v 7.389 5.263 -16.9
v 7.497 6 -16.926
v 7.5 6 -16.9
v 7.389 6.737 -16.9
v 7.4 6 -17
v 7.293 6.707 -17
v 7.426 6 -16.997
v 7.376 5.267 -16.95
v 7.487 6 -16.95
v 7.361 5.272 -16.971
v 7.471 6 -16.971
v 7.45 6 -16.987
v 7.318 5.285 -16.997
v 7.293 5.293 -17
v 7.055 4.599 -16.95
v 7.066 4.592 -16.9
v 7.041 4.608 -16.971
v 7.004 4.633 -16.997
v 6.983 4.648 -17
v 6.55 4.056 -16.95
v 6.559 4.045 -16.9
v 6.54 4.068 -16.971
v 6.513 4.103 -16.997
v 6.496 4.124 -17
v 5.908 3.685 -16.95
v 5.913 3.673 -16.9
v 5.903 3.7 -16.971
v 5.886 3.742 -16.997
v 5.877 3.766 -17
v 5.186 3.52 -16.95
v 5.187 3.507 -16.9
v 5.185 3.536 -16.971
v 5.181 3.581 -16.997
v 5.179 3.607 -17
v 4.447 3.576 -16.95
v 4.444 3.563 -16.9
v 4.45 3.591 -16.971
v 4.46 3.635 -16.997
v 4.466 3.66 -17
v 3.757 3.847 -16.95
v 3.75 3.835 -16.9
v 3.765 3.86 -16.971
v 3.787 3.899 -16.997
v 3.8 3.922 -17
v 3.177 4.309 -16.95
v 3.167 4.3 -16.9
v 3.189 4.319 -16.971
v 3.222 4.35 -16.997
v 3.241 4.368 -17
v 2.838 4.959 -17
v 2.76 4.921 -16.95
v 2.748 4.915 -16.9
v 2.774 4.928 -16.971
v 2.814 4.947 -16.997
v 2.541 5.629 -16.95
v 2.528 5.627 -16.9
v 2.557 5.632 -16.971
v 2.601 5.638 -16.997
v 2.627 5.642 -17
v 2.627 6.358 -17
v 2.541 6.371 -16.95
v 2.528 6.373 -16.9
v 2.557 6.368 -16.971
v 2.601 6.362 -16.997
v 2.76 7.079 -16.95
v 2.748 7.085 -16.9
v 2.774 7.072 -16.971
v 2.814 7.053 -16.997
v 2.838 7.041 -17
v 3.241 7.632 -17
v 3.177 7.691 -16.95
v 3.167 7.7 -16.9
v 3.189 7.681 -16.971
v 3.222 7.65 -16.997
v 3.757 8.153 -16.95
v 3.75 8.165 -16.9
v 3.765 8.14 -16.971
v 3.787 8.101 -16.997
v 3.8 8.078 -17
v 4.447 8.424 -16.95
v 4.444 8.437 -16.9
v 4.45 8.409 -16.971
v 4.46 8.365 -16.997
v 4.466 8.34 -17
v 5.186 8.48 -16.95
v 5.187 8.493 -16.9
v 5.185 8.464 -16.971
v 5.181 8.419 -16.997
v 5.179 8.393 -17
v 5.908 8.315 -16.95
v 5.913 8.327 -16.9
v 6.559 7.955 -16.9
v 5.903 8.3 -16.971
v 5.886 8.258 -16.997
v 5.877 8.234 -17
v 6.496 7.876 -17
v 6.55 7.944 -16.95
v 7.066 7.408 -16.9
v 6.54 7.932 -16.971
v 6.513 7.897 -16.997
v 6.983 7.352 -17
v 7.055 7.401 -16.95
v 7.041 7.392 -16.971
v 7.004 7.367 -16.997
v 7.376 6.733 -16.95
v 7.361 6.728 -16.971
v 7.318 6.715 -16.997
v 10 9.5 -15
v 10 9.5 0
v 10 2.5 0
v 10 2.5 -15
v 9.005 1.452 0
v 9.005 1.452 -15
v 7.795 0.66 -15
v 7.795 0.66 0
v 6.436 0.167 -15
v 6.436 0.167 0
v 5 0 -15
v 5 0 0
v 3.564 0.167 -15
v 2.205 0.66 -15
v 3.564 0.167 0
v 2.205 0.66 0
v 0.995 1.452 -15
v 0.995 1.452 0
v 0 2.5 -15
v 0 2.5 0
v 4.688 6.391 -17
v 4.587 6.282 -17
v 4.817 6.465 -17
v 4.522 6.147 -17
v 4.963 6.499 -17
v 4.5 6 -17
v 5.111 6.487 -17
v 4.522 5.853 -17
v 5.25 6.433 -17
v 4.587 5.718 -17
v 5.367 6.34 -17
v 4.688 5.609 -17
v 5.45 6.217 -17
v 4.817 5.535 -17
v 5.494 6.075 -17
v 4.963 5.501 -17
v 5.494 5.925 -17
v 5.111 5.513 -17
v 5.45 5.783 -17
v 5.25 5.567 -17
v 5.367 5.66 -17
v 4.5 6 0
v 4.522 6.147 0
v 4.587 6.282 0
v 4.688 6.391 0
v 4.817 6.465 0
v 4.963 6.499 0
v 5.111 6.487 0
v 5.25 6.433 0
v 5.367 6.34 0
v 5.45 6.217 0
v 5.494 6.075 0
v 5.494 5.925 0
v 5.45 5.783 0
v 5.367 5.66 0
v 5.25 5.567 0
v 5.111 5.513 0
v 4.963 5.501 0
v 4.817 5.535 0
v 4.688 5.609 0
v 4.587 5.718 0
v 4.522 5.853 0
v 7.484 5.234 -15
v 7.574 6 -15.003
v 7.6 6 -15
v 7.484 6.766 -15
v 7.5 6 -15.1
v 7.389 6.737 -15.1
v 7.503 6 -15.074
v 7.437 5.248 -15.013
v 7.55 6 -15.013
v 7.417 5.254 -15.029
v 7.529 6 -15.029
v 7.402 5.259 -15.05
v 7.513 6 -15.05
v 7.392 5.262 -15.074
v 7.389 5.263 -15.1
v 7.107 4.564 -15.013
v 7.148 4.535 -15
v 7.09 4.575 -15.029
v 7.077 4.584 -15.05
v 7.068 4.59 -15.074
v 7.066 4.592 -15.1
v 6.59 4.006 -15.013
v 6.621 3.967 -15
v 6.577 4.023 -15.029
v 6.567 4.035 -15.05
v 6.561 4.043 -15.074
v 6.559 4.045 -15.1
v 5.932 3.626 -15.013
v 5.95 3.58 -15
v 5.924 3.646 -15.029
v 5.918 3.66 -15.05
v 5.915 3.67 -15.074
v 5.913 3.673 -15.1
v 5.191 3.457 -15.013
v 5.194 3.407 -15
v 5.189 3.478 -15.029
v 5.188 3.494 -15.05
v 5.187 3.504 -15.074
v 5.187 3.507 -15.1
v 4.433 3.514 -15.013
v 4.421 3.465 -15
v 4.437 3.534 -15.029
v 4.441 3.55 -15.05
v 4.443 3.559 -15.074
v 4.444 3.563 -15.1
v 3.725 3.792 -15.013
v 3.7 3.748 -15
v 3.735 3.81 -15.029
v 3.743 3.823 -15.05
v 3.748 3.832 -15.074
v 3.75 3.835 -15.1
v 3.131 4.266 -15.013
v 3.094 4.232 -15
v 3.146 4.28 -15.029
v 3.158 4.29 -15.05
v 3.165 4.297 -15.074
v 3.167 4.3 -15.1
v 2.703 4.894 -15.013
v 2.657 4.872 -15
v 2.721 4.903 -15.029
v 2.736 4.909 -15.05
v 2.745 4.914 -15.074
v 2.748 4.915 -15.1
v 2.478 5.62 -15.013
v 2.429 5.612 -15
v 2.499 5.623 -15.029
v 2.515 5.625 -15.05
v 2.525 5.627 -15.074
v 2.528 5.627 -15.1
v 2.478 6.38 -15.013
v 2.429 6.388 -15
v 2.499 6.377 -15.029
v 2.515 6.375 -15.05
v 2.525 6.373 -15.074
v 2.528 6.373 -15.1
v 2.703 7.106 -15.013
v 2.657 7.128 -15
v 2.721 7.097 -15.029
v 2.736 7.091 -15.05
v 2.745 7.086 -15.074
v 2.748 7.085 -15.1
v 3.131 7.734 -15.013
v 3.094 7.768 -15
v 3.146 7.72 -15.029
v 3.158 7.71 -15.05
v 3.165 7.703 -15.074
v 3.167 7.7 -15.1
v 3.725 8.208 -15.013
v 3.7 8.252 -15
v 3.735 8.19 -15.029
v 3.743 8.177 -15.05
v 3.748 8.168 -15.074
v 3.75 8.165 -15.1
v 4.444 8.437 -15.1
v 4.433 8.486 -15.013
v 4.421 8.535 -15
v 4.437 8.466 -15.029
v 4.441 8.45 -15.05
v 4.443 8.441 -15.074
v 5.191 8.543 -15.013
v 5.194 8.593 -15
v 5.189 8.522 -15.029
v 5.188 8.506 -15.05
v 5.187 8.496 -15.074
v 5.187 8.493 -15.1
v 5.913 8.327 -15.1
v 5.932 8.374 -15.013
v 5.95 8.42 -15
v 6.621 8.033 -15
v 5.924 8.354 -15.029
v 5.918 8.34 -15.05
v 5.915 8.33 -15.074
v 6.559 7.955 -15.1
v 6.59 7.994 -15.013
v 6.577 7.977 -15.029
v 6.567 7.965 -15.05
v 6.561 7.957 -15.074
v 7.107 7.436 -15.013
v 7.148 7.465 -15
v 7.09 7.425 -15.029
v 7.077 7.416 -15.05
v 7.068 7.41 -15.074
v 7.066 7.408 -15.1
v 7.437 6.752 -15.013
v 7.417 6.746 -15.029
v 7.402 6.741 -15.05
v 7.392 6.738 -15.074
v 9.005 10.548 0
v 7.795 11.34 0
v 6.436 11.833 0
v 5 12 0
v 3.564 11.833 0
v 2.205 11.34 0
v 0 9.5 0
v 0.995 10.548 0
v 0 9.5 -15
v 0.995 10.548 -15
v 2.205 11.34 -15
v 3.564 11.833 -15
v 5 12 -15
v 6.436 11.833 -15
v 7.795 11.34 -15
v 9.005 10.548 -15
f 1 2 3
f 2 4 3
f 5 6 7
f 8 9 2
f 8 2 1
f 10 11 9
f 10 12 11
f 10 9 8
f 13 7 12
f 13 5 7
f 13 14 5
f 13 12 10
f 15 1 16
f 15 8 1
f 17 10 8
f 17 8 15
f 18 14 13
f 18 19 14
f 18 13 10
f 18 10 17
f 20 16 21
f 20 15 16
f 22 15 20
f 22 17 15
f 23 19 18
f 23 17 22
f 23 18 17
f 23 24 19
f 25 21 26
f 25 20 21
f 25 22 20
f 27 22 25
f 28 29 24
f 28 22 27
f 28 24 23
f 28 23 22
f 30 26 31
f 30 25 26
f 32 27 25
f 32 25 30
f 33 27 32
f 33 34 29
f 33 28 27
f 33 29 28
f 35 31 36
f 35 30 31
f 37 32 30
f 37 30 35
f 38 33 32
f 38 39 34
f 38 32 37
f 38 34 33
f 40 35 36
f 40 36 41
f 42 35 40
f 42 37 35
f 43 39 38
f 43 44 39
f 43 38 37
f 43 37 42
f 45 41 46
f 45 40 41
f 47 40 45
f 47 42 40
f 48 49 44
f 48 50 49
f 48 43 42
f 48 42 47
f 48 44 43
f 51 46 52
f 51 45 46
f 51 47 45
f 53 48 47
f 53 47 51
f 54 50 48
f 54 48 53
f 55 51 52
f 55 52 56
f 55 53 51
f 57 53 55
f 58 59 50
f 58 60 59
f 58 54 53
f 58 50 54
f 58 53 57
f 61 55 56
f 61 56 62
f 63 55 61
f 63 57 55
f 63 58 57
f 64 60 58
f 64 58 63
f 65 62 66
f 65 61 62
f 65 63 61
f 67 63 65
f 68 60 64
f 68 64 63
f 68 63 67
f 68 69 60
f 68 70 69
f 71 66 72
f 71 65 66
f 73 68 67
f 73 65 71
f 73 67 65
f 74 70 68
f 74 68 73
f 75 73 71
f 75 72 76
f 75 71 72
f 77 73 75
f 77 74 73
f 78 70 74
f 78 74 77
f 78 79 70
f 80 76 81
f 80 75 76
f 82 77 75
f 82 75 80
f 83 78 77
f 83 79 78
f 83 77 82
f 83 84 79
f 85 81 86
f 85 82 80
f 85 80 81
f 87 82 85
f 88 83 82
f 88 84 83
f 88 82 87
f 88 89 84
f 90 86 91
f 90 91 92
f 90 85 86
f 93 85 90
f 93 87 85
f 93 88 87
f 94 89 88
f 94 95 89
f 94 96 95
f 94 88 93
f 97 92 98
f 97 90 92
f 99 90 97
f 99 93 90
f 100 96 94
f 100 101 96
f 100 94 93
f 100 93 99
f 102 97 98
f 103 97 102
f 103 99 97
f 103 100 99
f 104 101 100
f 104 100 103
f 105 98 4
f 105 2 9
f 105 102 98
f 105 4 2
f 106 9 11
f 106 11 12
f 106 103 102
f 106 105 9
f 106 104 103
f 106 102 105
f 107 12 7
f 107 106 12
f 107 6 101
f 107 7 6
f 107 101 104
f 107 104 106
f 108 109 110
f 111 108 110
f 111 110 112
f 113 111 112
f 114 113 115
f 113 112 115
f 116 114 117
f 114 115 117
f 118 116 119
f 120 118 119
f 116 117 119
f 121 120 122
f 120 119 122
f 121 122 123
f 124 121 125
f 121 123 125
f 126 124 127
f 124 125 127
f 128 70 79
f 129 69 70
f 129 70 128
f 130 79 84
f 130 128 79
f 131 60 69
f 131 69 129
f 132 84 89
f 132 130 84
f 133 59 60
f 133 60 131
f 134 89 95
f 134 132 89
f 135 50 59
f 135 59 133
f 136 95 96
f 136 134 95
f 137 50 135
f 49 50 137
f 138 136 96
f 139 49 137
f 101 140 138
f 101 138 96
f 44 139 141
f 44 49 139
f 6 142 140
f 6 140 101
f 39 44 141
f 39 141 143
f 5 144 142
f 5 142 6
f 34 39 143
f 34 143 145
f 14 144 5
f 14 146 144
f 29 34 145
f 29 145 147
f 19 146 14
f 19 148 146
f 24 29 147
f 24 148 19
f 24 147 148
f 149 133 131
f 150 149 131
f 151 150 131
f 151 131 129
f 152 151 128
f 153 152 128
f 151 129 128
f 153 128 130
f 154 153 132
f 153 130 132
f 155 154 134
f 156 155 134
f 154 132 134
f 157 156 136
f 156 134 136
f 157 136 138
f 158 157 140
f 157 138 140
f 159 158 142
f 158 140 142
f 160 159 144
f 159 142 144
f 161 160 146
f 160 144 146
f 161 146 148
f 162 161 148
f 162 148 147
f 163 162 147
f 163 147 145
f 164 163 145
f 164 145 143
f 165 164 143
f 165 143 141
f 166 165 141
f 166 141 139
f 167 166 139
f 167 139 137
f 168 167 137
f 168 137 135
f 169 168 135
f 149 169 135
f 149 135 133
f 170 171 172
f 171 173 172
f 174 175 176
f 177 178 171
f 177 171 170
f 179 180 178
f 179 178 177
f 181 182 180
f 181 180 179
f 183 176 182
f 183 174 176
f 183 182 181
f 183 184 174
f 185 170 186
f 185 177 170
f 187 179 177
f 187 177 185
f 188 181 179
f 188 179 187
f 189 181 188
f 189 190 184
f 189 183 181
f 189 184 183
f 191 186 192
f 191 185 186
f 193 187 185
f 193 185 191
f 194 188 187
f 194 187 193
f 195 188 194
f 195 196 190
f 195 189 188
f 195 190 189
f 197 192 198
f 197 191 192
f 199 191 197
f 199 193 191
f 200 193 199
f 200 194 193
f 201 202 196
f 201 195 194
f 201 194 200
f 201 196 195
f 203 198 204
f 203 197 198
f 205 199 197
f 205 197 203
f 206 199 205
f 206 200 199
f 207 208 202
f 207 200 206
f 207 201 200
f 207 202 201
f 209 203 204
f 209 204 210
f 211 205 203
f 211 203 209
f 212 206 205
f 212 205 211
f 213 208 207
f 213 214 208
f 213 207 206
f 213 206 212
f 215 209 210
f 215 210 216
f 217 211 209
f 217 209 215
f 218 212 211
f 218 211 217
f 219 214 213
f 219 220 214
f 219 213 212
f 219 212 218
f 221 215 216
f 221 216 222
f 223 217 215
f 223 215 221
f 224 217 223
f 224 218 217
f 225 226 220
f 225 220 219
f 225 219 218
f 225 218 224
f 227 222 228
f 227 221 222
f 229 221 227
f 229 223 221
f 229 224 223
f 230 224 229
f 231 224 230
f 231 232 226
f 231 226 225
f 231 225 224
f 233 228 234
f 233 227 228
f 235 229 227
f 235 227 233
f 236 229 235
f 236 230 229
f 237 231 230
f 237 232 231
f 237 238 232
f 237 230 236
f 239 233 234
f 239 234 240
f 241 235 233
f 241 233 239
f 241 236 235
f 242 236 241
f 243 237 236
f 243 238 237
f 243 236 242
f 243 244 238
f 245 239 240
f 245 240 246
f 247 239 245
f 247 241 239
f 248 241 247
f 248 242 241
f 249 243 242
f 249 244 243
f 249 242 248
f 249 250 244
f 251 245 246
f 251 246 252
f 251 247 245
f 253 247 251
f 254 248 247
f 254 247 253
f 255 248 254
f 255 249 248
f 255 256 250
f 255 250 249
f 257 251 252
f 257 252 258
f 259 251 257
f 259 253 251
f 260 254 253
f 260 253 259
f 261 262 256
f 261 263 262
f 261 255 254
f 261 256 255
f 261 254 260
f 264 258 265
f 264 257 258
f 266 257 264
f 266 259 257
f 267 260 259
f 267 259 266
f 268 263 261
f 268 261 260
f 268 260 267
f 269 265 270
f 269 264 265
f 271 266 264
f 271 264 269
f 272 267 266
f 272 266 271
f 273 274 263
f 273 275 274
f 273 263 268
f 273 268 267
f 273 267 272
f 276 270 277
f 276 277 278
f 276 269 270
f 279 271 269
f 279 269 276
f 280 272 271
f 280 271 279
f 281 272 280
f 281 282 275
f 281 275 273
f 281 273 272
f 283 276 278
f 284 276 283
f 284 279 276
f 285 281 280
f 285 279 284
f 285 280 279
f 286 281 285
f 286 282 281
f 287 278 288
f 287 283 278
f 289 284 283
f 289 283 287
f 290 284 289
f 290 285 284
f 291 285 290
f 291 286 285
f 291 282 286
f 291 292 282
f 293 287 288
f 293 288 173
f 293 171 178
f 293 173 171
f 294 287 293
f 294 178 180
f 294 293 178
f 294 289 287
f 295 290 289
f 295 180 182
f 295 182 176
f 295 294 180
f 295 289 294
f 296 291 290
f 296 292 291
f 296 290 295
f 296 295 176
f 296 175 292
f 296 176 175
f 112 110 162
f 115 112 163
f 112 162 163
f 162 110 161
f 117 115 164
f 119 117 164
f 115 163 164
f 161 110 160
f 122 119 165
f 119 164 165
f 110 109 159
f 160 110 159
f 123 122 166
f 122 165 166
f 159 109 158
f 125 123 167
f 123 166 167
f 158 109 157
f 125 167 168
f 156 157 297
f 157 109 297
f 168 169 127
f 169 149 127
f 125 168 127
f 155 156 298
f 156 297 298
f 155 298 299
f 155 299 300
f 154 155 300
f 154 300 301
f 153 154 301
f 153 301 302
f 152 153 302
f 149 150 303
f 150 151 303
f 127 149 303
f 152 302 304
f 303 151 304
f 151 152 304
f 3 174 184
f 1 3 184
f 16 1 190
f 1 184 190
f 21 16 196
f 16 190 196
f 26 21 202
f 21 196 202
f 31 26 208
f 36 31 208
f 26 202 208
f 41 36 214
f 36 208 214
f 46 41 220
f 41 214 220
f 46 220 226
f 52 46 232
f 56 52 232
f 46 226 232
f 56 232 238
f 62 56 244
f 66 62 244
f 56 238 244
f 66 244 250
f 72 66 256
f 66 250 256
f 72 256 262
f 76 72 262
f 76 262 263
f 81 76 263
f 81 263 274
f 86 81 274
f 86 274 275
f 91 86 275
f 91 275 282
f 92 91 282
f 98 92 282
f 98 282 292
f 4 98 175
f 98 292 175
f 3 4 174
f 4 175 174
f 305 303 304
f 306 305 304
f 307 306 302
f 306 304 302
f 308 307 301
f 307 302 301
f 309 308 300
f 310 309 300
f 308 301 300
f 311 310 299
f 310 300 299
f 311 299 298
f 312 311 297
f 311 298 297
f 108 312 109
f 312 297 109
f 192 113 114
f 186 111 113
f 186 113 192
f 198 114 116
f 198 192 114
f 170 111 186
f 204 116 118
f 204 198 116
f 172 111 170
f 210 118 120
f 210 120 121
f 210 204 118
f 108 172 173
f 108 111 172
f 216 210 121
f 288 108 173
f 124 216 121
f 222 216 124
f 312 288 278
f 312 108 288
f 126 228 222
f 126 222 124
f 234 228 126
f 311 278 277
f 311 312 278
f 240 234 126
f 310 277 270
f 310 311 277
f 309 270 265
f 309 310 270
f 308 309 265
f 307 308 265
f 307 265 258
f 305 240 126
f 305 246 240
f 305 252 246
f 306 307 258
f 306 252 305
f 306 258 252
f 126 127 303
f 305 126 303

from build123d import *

# Parameters (mm, degrees)
BOSS_EXTRUDE1_DEPTH = 15
SKETCH3_R           = 2.5
BOSS_EXTRUDE2_DEPTH = 2
SKETCH5_R           = 0.5
CUT_EXTRUDE1_DEPTH  = 24.086792761
FILLET1_R           = 0.1


with BuildPart() as part:
    # Sketch1 → Boss-Extrude1 (new body)
    with BuildSketch(Plane.XY):
        with BuildLine():
            Line((0, 2.5), (0, 9.5))
            ThreePointArc((0, 9.5), (5, 12), (10, 9.5))
            Line((10, 9.5), (10, 2.5))
            ThreePointArc((10, 2.5), (5, 0), (0, 2.5))
        make_face()
    extrude(amount=-BOSS_EXTRUDE1_DEPTH)

    # Sketch3 → Boss-Extrude2 (add)
    with BuildSketch(Plane(origin=(0, 0, -15), x_dir=(-1, 0, 0), z_dir=(0, 0, -1))):
        with Locations(Location((-5, 6, 0), (0, 0, 180))):
            Circle(SKETCH3_R)
    extrude(amount=BOSS_EXTRUDE2_DEPTH)

    # Sketch5 → Cut-Extrude1 (cut, through all)
    with BuildSketch(Plane(origin=(0, 0, -17), x_dir=(-1, 0, 0), z_dir=(0, 0, -1))):
        with Locations((-5, 6)):
            Circle(SKETCH5_R)
    extrude(amount=-CUT_EXTRUDE1_DEPTH, mode=Mode.SUBTRACT)

    # Fillet1
    fillet1_edges = [part.edges().sort_by_distance(p)[0] for p in [
        (2.5, 6, -15),
        (2.5, 6, -17),
    ]]
    fillet(fillet1_edges, radius=FILLET1_R)


solid = part.part
